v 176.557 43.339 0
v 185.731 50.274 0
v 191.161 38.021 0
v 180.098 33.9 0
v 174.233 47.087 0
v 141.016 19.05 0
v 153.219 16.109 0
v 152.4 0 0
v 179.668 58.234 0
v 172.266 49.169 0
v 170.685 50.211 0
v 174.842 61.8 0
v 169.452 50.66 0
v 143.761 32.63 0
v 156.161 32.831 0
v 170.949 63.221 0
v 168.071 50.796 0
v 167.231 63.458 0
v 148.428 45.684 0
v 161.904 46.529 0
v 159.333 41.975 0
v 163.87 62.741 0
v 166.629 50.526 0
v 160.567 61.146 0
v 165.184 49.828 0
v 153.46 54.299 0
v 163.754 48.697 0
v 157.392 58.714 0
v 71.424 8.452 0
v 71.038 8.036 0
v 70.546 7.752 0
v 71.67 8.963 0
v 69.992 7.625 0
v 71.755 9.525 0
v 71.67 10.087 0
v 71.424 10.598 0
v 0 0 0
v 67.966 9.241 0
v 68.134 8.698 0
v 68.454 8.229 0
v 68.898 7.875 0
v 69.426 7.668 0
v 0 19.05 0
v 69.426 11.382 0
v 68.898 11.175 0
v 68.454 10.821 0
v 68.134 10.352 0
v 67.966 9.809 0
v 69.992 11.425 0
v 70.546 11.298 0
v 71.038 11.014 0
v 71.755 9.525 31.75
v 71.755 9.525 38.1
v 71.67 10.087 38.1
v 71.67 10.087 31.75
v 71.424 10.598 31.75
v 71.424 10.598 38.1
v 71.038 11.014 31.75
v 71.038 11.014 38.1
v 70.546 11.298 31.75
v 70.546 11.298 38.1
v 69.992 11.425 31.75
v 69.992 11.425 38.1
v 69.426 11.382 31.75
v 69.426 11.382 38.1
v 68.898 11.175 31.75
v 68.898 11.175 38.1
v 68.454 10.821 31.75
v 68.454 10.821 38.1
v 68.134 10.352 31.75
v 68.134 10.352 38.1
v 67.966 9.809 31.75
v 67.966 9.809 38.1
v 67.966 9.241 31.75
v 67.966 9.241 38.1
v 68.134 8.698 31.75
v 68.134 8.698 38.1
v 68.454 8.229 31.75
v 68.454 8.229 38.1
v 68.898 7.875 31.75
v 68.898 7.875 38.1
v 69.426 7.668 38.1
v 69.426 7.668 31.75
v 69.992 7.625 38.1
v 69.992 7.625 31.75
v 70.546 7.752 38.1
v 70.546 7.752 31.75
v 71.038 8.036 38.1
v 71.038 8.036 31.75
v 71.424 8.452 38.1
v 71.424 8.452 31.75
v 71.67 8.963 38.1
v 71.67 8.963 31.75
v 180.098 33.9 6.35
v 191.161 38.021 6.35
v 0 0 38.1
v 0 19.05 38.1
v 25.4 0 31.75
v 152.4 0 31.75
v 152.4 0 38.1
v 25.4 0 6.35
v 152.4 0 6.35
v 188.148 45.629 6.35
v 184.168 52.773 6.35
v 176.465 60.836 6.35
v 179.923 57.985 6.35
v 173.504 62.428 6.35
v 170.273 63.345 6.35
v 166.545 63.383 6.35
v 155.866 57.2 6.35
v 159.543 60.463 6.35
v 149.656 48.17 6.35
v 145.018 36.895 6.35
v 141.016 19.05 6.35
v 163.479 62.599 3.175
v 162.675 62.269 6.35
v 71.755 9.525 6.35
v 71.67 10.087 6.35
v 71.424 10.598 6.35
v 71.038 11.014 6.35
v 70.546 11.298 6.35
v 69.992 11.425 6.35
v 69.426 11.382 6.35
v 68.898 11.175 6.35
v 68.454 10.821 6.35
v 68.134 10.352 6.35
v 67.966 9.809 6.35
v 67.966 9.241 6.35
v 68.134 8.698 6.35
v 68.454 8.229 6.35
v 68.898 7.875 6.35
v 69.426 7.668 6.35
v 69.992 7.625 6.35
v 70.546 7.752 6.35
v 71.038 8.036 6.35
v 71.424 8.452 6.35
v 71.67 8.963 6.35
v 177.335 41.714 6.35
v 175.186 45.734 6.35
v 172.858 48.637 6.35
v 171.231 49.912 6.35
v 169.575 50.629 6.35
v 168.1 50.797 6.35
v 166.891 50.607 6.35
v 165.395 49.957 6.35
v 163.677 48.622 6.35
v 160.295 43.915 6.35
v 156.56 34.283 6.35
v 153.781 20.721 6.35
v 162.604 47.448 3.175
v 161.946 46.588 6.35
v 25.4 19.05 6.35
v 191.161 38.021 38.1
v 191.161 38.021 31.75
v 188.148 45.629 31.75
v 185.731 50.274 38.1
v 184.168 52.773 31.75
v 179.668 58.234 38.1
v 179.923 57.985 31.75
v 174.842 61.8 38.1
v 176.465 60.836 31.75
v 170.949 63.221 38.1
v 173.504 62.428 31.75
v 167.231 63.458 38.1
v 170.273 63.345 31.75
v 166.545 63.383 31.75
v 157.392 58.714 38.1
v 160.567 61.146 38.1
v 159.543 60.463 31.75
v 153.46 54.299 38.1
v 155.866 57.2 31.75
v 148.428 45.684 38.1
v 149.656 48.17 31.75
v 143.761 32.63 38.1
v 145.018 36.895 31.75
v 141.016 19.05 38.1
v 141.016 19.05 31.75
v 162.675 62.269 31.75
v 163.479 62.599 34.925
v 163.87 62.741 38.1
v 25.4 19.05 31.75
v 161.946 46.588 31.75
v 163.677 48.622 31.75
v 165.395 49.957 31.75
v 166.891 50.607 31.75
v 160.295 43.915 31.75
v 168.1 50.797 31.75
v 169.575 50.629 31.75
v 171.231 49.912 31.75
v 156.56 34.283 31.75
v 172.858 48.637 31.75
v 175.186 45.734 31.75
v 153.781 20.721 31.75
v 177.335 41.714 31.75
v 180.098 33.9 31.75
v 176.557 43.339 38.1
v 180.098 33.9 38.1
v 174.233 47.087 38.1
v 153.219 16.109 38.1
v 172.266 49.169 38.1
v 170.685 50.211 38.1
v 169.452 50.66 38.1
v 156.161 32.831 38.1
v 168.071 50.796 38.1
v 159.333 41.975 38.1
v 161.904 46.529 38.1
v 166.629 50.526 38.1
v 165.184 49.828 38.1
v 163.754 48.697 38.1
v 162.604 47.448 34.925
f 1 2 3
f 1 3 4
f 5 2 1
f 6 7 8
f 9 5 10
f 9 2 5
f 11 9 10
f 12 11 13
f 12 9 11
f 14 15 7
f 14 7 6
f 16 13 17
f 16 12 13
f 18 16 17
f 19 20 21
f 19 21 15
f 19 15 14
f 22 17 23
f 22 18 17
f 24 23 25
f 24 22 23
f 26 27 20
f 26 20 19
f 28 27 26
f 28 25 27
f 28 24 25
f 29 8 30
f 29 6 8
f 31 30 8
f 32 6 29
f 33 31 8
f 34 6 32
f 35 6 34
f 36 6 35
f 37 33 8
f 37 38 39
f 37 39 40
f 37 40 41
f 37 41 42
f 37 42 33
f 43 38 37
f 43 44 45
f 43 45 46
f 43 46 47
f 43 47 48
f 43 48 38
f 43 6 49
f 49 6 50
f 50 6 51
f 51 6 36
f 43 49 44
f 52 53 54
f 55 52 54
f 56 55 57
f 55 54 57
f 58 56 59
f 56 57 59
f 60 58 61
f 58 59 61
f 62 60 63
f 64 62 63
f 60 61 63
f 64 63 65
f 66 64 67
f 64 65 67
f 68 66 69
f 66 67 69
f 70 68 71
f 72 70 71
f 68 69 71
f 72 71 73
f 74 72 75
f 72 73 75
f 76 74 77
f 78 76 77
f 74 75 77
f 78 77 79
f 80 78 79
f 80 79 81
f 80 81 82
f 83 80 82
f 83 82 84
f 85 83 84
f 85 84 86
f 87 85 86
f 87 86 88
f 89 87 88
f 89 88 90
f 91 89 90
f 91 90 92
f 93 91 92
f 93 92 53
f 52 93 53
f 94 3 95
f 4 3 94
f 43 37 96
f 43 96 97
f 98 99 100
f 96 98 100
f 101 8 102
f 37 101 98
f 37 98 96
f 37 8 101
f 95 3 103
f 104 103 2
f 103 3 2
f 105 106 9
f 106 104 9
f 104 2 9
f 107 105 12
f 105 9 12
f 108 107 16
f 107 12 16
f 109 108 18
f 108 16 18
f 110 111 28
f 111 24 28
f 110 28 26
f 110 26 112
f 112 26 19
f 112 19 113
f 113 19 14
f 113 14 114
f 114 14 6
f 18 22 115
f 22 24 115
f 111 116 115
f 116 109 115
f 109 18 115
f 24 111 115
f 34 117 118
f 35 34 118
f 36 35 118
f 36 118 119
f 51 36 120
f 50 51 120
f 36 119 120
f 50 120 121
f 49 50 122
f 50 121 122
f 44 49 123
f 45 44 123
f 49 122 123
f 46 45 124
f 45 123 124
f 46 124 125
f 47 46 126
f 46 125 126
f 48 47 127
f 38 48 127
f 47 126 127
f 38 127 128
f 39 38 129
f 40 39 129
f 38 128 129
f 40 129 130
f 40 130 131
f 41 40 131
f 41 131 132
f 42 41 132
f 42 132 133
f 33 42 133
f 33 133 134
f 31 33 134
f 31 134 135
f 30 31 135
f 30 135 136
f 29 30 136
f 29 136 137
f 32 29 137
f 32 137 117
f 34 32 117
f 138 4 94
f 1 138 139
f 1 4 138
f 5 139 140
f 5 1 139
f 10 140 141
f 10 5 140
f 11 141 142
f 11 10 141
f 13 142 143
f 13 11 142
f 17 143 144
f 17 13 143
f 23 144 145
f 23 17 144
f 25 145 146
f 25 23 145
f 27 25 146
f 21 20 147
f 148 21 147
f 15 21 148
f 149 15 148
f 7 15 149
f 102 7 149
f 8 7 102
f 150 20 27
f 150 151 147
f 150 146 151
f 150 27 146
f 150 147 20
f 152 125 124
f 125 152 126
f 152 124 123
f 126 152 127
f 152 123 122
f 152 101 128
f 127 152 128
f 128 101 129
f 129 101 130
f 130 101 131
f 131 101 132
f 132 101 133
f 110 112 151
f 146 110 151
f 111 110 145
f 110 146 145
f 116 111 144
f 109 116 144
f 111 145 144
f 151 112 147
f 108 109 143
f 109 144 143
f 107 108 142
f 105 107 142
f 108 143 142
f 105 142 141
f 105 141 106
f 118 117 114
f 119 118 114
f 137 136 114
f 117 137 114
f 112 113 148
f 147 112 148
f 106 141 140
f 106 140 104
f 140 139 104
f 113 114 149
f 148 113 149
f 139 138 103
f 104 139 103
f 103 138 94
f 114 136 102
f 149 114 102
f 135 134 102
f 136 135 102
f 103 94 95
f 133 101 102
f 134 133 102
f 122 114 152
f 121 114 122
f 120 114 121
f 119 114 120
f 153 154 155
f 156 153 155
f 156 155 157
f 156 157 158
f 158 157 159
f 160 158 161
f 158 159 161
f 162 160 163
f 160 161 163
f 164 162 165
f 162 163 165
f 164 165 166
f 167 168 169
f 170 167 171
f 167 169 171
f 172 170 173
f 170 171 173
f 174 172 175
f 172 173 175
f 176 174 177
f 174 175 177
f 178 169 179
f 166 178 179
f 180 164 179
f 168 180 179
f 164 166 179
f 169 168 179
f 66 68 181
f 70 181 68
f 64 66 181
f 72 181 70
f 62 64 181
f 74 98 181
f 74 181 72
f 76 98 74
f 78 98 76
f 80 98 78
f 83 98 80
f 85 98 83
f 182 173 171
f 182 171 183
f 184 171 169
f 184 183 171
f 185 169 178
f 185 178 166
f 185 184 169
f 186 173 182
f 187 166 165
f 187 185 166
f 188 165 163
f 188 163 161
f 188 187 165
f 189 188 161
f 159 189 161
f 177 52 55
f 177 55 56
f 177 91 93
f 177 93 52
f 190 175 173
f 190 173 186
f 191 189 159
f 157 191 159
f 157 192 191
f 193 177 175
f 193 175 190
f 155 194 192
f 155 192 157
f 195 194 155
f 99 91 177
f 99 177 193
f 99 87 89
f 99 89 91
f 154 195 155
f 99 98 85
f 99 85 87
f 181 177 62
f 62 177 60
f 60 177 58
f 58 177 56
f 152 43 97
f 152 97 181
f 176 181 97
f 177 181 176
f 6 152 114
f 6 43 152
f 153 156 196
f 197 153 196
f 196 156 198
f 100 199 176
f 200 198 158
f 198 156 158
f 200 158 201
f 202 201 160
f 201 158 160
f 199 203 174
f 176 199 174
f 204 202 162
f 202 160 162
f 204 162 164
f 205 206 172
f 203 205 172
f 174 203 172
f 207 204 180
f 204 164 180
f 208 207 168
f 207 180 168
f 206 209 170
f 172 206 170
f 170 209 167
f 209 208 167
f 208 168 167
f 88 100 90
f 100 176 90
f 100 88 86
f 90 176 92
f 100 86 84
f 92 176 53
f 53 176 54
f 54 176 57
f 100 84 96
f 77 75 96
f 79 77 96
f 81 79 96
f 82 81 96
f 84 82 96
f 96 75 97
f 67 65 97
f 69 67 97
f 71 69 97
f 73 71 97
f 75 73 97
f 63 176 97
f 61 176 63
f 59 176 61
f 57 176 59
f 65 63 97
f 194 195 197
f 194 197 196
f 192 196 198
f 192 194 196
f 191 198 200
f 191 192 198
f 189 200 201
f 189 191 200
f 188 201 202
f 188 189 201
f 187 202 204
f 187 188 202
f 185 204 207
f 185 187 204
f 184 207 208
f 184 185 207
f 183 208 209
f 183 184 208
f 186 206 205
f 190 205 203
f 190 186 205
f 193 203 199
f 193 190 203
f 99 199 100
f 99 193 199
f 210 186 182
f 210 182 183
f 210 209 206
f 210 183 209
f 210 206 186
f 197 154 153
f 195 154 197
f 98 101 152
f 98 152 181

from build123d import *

# Parameters (mm, degrees)
BOSS_EXTRUDE1_DEPTH = 38.1
SKETCH2_W           = 260.312588867
SKETCH2_H           = 25.4
CUT_EXTRUDE1_DEPTH  = 206.003825783
SKETCH3_R           = 1.905
CUT_EXTRUDE2_DEPTH  = 206.003825783


with BuildPart() as part:
    # Sketch1 → Boss-Extrude1 (new body)
    with BuildSketch(Plane.XY):
        with BuildLine():
            Line((0, 0), (0, 19.05))
            Line((0, 19.05), (141.01618732, 19.05))
            add(Edge.make_bspline(
                [(191.161472393, 38.021436866), (157.754291932, 137.325067756), (141.01618732, 19.05)],
                knots=[5.354344466, 5.354344466, 5.354344466, 7.54928898, 7.54928898, 7.54928898], degree=2, weights=[1, 0.455847413, 1]))
            Line((191.161472393, 38.021436866), (180.098192457, 33.90003112))
            add(Edge.make_bspline(
                [(180.098192457, 33.90003112), (152.4, 132.820472934), (152.4, 0)],
                knots=[5.442998148, 5.442998148, 5.442998148, 7.853981634, 7.853981634, 7.853981634], degree=2, weights=[1, 0.357233797, 1]))
            Line((152.4, 0), (0, 0))
        make_face()
    extrude(amount=BOSS_EXTRUDE1_DEPTH)

    # Sketch2 → Cut-Extrude1 (cut, through all)
    with BuildSketch(Plane.XZ):
        with Locations((155.556294433, 19.05)):
            Rectangle(SKETCH2_W, SKETCH2_H)
    extrude(amount=-CUT_EXTRUDE1_DEPTH, mode=Mode.SUBTRACT)

    # Sketch3 → Cut-Extrude2 (cut, through all)
    with BuildSketch(Plane.XY.offset(38.1)):
        with Locations((69.85, 9.525)):
            Circle(SKETCH3_R)
    extrude(amount=-CUT_EXTRUDE2_DEPTH, mode=Mode.SUBTRACT)


solid = part.part
